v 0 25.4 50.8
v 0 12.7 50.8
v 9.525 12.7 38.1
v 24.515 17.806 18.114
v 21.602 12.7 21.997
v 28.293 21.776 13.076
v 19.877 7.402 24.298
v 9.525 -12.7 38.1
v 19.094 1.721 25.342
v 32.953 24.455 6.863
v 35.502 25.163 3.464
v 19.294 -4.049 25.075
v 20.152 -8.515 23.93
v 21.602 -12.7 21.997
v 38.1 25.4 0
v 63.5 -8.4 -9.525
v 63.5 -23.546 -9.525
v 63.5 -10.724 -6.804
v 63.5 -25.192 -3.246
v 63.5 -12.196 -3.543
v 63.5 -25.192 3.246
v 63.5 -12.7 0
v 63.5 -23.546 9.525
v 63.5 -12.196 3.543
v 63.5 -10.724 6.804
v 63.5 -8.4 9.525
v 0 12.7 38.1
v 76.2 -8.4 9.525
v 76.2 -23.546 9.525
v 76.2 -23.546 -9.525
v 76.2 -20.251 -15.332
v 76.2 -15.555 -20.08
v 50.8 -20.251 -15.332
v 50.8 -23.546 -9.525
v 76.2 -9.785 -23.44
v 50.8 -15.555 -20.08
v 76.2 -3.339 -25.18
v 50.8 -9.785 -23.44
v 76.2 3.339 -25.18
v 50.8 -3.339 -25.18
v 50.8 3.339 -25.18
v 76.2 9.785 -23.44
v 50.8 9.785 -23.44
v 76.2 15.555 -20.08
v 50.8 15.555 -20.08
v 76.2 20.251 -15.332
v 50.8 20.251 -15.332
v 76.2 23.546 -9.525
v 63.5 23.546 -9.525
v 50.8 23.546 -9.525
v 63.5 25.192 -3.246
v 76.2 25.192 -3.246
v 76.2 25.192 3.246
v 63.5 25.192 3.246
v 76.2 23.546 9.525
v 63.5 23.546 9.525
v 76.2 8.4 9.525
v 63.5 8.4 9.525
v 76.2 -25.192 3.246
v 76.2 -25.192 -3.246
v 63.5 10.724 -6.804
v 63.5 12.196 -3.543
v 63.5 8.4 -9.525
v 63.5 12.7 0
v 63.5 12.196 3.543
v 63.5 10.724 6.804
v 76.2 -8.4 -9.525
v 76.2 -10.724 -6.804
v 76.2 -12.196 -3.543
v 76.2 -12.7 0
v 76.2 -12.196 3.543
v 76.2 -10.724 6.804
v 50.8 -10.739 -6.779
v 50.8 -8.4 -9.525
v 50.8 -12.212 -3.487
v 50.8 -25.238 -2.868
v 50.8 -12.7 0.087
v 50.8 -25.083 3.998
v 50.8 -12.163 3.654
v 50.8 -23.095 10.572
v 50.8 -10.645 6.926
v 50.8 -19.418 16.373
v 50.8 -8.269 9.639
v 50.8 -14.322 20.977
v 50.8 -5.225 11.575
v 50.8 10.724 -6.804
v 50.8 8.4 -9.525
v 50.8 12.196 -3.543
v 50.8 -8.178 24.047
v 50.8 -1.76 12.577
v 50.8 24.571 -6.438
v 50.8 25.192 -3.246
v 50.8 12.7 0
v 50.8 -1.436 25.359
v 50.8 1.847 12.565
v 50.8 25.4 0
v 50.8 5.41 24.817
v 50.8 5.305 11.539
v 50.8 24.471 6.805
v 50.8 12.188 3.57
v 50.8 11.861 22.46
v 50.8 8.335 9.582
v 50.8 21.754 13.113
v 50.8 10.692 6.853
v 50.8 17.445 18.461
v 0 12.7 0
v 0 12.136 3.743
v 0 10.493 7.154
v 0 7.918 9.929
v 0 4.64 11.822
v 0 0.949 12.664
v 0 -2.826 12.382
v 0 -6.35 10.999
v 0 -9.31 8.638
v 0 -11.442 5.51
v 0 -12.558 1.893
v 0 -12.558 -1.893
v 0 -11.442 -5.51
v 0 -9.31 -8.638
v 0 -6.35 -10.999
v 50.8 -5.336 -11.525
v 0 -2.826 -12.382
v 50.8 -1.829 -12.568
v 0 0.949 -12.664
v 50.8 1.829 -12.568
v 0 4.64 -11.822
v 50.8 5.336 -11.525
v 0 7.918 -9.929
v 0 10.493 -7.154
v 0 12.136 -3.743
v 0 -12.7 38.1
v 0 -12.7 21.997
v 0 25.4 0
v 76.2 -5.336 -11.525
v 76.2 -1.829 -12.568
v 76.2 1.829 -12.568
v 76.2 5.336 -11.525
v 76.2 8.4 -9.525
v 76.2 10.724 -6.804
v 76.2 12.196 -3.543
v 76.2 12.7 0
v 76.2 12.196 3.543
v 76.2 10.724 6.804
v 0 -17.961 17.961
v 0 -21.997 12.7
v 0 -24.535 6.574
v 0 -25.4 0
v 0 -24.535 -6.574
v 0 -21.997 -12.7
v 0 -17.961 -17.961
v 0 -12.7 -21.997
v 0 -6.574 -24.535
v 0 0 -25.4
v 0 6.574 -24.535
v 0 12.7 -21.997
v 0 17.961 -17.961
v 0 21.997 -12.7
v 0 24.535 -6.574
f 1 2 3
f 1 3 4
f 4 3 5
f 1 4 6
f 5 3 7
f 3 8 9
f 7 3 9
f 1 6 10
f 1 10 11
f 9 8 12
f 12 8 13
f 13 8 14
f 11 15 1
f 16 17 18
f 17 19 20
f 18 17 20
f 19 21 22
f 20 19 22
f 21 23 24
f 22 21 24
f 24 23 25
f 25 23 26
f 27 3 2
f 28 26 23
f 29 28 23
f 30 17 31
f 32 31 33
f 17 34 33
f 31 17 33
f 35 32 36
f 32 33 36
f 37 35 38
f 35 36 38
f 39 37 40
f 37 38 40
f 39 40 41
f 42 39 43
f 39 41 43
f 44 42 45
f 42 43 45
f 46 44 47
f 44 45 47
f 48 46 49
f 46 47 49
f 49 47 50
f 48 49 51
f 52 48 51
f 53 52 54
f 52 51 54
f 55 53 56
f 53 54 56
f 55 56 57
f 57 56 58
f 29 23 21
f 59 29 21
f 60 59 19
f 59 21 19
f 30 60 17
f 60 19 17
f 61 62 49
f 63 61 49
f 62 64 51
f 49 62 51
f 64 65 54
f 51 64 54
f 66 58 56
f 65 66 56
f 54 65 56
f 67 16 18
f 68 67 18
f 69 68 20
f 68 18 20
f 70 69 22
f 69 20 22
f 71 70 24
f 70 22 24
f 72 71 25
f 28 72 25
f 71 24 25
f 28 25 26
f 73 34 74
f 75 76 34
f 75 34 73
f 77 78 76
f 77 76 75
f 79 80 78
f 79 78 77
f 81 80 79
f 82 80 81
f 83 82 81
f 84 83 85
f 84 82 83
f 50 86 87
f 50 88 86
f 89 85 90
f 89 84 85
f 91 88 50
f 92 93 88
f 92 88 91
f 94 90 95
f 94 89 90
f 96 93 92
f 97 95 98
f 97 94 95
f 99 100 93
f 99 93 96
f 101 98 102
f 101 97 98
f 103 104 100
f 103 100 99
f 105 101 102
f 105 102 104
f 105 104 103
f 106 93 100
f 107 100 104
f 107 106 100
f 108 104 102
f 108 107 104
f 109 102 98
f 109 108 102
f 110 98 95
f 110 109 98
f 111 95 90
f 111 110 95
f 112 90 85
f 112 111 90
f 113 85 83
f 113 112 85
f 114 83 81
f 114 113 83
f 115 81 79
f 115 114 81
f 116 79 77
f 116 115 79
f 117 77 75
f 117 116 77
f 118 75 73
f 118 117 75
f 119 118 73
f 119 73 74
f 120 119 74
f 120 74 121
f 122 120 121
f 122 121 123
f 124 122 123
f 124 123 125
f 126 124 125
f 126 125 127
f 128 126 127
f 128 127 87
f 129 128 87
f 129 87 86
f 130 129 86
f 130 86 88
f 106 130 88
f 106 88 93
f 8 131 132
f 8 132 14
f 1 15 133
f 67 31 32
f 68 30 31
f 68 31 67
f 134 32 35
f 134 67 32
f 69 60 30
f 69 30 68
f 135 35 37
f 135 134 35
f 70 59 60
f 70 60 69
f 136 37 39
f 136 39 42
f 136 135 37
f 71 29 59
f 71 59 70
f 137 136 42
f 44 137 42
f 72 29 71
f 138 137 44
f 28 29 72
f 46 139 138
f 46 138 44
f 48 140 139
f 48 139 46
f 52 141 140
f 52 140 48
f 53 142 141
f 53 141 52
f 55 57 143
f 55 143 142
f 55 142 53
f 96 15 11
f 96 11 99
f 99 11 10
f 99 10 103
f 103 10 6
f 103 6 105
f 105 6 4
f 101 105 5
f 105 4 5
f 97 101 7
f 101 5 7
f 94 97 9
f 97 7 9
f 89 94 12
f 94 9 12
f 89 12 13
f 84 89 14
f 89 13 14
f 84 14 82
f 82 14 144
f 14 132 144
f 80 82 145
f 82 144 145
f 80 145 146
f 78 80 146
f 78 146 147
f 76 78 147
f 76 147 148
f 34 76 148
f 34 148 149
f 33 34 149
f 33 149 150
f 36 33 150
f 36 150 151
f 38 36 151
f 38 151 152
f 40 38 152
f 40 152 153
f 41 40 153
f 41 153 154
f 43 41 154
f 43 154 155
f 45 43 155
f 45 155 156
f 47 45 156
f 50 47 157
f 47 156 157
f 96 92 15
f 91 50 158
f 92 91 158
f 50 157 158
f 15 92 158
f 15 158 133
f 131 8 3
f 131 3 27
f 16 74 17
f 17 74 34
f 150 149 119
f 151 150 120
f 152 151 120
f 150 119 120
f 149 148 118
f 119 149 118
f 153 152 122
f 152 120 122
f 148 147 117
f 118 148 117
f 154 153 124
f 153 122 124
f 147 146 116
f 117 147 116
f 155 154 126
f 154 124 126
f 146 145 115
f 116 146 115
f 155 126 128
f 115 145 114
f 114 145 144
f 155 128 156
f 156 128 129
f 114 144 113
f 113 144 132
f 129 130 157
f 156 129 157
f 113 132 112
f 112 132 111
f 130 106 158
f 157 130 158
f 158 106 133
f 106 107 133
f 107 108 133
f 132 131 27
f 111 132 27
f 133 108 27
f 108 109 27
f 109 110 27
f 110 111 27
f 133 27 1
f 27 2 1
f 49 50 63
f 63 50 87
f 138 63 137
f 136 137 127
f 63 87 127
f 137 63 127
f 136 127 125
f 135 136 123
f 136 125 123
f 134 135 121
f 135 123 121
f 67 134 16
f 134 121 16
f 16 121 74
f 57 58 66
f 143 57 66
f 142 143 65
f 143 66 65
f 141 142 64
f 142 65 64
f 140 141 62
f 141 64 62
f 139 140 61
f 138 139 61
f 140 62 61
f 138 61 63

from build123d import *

# Parameters (mm, degrees)
F0_R      = 25.4
F0_R_2    = 12.7
F1_DEPTH  = 50.8
F3_DEPTH  = 12.7
F5_DEPTH  = 12.7
F8_DEPTH  = 25.4
F10_DEPTH = 12.7


with BuildPart() as f1:
    # F0 (on Right) → F1 (new body)
    with BuildSketch(Plane.YZ):
        Circle(F0_R)
        Circle(F0_R_2, mode=Mode.SUBTRACT)
    extrude(amount=F1_DEPTH)

    # F2 (on face) → F3 (join)
    with BuildSketch(Plane.YZ.offset(50.8)):
        with BuildLine():
            Line((-8.40026, -9.525), (-23.54643, -9.525))
            ThreePointArc((-23.54643, -9.525), (0, -25.4), (23.54643, -9.525))
            Line((23.54643, -9.525), (8.40026, -9.525))
            ThreePointArc((8.40026, -9.525), (0, -12.7), (-8.40026, -9.525))
        make_face()
    extrude(amount=F3_DEPTH)

    # F4 (on face) → F5 (join)
    with BuildSketch(Plane.YZ.offset(63.5)):
        with BuildLine():
            ThreePointArc((-23.54643, -9.525), (0, -25.4), (23.54643, -9.525))
            ThreePointArc((23.54643, -9.525), (25.4, 0), (23.54643, 9.525))
            Line((23.54643, 9.525), (8.40026, 9.525))
            ThreePointArc((8.40026, 9.525), (12.7, 0), (8.40026, -9.525))
            ThreePointArc((8.40026, -9.525), (0, -12.7), (-8.40026, -9.525))
            ThreePointArc((-8.40026, -9.525), (-12.7, 0), (-8.40026, 9.525))
            Line((-8.40026, 9.525), (-23.54643, 9.525))
            ThreePointArc((-23.54643, 9.525), (-25.4, 0), (-23.54643, -9.525))
        make_face()
    extrude(amount=F5_DEPTH)

    # F7 (on offset) → F8 (join)
    with BuildSketch(Plane.XZ.offset(12.7)):
        Polygon((19.05, 25.4), (0, 25.4), (0, 19.05), (23.8125, 19.05), align=None)
        Polygon((0, 38.1), (0, 25.4), (19.05, 25.4), (9.525, 38.1), align=None)
    extrude(amount=-F8_DEPTH)

    # F9 (on face) → F10 (join)
    with BuildSketch(Plane(origin=(0, 12.7, 0), x_dir=(-1, 0, 0), z_dir=(0, 1, 0))):
        Polygon((0, 25.4), (0, 38.1), (-9.525, 38.1), (-38.1, 0), (0, 0), align=None)
        Polygon((-9.525, 38.1), (0, 38.1), (0, 50.8), align=None)
    extrude(amount=F10_DEPTH)


solid = f1.part
